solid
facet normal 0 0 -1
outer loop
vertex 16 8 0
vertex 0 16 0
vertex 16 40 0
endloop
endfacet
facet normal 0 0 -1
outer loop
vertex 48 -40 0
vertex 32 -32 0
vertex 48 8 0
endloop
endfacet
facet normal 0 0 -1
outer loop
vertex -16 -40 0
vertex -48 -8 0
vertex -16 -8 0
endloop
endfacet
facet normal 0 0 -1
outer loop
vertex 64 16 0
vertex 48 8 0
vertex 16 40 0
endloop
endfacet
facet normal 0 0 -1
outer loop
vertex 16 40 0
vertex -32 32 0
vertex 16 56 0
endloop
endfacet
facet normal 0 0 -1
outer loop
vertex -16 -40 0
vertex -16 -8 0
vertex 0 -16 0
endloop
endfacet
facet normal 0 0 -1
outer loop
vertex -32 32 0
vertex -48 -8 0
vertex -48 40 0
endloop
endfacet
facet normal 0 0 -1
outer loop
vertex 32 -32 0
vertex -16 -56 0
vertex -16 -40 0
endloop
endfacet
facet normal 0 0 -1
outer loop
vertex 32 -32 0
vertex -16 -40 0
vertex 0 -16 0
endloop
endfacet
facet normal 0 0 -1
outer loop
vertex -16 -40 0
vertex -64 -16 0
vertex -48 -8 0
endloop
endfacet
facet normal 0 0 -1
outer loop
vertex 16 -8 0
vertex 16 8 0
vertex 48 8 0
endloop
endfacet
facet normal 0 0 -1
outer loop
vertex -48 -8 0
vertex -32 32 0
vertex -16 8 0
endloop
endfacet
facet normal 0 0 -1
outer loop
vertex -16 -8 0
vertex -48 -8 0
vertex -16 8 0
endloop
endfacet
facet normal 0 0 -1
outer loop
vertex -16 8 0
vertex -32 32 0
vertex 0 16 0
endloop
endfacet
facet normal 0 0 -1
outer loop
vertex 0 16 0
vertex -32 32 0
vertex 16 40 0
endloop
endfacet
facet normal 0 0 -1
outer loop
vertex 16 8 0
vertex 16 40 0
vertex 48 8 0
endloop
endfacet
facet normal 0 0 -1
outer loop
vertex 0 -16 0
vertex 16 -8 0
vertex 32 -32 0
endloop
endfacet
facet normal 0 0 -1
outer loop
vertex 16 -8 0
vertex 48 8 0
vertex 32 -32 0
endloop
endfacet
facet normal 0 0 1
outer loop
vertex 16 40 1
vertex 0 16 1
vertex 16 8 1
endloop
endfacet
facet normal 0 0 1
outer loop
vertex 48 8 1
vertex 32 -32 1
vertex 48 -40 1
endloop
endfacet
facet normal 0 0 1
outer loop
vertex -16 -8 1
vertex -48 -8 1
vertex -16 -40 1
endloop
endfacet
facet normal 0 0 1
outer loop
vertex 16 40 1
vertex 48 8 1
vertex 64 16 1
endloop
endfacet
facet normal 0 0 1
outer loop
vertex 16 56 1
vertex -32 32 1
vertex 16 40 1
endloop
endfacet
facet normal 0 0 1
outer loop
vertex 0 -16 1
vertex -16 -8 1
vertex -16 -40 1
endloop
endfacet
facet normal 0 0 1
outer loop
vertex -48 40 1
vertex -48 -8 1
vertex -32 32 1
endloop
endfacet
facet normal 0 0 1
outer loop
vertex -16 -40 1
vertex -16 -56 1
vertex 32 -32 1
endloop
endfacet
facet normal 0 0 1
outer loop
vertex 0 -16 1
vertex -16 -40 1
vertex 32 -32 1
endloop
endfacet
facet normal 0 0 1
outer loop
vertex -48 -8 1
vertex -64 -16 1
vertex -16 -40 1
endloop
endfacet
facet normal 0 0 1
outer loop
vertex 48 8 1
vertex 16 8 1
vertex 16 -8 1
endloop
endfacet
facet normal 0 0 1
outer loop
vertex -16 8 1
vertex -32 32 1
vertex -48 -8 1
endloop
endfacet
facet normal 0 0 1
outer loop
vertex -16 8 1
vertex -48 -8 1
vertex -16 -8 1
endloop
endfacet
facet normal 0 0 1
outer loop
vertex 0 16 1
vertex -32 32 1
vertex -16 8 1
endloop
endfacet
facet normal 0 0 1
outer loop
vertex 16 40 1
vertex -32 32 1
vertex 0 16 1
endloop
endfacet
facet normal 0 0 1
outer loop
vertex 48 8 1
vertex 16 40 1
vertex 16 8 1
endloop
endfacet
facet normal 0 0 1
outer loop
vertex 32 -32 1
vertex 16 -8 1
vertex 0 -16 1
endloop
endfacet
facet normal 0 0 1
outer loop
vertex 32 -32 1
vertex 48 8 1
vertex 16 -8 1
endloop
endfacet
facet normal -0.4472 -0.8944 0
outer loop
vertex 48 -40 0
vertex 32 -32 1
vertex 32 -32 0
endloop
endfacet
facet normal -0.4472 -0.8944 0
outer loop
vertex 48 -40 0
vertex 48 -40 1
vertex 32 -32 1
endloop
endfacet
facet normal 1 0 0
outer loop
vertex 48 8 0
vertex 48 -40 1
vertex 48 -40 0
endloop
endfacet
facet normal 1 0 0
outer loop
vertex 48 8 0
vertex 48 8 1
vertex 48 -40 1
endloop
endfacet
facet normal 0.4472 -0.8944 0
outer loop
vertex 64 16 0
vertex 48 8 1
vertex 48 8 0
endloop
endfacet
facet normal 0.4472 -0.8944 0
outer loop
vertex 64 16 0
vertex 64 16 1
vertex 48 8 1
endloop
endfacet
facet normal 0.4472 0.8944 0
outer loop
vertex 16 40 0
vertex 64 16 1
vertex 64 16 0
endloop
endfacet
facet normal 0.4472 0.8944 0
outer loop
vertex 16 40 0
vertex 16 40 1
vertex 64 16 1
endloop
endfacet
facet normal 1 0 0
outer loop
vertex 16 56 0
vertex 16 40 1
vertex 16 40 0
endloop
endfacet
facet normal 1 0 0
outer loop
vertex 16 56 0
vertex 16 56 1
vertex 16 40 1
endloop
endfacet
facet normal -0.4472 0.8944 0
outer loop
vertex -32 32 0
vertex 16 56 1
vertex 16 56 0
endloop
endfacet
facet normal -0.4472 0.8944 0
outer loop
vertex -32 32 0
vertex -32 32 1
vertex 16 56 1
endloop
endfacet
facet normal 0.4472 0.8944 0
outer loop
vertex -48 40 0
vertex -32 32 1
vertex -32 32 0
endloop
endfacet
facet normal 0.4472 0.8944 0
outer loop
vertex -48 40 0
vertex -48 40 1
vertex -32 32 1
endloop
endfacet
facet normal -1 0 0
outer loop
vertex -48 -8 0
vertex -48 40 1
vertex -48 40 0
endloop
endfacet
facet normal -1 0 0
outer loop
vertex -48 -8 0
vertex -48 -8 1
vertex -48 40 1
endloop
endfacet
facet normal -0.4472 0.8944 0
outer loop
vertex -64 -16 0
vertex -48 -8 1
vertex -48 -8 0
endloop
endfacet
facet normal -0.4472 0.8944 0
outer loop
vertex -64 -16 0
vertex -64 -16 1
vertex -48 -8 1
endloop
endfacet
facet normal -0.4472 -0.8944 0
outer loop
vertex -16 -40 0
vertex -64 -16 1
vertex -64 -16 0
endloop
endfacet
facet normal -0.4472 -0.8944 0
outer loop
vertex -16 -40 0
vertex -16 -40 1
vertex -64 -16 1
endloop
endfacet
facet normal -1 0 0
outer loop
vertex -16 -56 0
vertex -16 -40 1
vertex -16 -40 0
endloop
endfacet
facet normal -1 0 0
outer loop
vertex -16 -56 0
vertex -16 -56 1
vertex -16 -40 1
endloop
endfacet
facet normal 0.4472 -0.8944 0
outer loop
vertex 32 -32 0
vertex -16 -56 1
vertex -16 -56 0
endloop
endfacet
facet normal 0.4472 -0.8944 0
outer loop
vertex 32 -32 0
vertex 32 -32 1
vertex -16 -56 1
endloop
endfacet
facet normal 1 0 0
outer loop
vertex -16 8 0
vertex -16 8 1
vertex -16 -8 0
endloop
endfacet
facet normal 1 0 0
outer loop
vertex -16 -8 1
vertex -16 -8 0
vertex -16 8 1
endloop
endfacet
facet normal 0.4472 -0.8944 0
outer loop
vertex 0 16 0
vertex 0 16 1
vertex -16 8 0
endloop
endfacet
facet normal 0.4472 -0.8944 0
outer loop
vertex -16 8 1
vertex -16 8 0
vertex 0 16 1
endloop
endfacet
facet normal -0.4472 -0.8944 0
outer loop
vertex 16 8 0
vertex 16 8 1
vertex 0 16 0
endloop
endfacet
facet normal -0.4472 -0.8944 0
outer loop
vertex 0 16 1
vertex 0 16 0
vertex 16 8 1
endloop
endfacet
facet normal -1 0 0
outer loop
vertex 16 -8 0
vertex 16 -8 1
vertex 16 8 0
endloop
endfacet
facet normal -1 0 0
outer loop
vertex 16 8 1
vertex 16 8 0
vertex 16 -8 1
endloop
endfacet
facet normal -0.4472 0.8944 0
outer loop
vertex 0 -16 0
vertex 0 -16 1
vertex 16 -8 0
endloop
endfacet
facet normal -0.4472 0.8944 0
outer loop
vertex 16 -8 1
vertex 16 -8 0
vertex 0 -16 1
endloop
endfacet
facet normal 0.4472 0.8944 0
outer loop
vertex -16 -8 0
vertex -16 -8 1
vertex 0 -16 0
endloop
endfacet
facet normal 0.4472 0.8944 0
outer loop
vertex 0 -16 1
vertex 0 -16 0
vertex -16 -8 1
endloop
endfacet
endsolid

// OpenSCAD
UNIT = 16;
THIRD_UNIT = UNIT / 3;
THREE_HALF_UNIT = UNIT + UNIT * 0.5;
HALF_UNIT = UNIT / 2;
UNIT_WIDTH = sqrt(UNIT * UNIT + HALF_UNIT * HALF_UNIT);
THICKNESS=1;

POINTS = [
  [-3 * UNIT, -HALF_UNIT],
  [-3 * UNIT, 2.5 * UNIT],
  [-2 * UNIT, 2 * UNIT],
  [UNIT, 3.5 * UNIT],
  [UNIT, 2.5 * UNIT],
  [4 * UNIT, UNIT],
  [3 * UNIT, HALF_UNIT],
  [3 * UNIT, -2.5 * UNIT],
  [2 * UNIT, -2 * UNIT],
  [-UNIT, -3.5 * UNIT],
  [-UNIT, -2.5 * UNIT],
  [-4 * UNIT, -UNIT],
  [-UNIT, -HALF_UNIT],
  [-UNIT, HALF_UNIT],
  [0, UNIT],
  [UNIT, HALF_UNIT],
  [UNIT, -HALF_UNIT],
  [0, -UNIT],
];

linear_extrude(THICKNESS) polygon(points=POINTS, paths=[[0, 1, 2, 3, 4, 5, 6, 7, 8, 9, 10, 11], [12, 13, 14, 15, 16, 17]]);
